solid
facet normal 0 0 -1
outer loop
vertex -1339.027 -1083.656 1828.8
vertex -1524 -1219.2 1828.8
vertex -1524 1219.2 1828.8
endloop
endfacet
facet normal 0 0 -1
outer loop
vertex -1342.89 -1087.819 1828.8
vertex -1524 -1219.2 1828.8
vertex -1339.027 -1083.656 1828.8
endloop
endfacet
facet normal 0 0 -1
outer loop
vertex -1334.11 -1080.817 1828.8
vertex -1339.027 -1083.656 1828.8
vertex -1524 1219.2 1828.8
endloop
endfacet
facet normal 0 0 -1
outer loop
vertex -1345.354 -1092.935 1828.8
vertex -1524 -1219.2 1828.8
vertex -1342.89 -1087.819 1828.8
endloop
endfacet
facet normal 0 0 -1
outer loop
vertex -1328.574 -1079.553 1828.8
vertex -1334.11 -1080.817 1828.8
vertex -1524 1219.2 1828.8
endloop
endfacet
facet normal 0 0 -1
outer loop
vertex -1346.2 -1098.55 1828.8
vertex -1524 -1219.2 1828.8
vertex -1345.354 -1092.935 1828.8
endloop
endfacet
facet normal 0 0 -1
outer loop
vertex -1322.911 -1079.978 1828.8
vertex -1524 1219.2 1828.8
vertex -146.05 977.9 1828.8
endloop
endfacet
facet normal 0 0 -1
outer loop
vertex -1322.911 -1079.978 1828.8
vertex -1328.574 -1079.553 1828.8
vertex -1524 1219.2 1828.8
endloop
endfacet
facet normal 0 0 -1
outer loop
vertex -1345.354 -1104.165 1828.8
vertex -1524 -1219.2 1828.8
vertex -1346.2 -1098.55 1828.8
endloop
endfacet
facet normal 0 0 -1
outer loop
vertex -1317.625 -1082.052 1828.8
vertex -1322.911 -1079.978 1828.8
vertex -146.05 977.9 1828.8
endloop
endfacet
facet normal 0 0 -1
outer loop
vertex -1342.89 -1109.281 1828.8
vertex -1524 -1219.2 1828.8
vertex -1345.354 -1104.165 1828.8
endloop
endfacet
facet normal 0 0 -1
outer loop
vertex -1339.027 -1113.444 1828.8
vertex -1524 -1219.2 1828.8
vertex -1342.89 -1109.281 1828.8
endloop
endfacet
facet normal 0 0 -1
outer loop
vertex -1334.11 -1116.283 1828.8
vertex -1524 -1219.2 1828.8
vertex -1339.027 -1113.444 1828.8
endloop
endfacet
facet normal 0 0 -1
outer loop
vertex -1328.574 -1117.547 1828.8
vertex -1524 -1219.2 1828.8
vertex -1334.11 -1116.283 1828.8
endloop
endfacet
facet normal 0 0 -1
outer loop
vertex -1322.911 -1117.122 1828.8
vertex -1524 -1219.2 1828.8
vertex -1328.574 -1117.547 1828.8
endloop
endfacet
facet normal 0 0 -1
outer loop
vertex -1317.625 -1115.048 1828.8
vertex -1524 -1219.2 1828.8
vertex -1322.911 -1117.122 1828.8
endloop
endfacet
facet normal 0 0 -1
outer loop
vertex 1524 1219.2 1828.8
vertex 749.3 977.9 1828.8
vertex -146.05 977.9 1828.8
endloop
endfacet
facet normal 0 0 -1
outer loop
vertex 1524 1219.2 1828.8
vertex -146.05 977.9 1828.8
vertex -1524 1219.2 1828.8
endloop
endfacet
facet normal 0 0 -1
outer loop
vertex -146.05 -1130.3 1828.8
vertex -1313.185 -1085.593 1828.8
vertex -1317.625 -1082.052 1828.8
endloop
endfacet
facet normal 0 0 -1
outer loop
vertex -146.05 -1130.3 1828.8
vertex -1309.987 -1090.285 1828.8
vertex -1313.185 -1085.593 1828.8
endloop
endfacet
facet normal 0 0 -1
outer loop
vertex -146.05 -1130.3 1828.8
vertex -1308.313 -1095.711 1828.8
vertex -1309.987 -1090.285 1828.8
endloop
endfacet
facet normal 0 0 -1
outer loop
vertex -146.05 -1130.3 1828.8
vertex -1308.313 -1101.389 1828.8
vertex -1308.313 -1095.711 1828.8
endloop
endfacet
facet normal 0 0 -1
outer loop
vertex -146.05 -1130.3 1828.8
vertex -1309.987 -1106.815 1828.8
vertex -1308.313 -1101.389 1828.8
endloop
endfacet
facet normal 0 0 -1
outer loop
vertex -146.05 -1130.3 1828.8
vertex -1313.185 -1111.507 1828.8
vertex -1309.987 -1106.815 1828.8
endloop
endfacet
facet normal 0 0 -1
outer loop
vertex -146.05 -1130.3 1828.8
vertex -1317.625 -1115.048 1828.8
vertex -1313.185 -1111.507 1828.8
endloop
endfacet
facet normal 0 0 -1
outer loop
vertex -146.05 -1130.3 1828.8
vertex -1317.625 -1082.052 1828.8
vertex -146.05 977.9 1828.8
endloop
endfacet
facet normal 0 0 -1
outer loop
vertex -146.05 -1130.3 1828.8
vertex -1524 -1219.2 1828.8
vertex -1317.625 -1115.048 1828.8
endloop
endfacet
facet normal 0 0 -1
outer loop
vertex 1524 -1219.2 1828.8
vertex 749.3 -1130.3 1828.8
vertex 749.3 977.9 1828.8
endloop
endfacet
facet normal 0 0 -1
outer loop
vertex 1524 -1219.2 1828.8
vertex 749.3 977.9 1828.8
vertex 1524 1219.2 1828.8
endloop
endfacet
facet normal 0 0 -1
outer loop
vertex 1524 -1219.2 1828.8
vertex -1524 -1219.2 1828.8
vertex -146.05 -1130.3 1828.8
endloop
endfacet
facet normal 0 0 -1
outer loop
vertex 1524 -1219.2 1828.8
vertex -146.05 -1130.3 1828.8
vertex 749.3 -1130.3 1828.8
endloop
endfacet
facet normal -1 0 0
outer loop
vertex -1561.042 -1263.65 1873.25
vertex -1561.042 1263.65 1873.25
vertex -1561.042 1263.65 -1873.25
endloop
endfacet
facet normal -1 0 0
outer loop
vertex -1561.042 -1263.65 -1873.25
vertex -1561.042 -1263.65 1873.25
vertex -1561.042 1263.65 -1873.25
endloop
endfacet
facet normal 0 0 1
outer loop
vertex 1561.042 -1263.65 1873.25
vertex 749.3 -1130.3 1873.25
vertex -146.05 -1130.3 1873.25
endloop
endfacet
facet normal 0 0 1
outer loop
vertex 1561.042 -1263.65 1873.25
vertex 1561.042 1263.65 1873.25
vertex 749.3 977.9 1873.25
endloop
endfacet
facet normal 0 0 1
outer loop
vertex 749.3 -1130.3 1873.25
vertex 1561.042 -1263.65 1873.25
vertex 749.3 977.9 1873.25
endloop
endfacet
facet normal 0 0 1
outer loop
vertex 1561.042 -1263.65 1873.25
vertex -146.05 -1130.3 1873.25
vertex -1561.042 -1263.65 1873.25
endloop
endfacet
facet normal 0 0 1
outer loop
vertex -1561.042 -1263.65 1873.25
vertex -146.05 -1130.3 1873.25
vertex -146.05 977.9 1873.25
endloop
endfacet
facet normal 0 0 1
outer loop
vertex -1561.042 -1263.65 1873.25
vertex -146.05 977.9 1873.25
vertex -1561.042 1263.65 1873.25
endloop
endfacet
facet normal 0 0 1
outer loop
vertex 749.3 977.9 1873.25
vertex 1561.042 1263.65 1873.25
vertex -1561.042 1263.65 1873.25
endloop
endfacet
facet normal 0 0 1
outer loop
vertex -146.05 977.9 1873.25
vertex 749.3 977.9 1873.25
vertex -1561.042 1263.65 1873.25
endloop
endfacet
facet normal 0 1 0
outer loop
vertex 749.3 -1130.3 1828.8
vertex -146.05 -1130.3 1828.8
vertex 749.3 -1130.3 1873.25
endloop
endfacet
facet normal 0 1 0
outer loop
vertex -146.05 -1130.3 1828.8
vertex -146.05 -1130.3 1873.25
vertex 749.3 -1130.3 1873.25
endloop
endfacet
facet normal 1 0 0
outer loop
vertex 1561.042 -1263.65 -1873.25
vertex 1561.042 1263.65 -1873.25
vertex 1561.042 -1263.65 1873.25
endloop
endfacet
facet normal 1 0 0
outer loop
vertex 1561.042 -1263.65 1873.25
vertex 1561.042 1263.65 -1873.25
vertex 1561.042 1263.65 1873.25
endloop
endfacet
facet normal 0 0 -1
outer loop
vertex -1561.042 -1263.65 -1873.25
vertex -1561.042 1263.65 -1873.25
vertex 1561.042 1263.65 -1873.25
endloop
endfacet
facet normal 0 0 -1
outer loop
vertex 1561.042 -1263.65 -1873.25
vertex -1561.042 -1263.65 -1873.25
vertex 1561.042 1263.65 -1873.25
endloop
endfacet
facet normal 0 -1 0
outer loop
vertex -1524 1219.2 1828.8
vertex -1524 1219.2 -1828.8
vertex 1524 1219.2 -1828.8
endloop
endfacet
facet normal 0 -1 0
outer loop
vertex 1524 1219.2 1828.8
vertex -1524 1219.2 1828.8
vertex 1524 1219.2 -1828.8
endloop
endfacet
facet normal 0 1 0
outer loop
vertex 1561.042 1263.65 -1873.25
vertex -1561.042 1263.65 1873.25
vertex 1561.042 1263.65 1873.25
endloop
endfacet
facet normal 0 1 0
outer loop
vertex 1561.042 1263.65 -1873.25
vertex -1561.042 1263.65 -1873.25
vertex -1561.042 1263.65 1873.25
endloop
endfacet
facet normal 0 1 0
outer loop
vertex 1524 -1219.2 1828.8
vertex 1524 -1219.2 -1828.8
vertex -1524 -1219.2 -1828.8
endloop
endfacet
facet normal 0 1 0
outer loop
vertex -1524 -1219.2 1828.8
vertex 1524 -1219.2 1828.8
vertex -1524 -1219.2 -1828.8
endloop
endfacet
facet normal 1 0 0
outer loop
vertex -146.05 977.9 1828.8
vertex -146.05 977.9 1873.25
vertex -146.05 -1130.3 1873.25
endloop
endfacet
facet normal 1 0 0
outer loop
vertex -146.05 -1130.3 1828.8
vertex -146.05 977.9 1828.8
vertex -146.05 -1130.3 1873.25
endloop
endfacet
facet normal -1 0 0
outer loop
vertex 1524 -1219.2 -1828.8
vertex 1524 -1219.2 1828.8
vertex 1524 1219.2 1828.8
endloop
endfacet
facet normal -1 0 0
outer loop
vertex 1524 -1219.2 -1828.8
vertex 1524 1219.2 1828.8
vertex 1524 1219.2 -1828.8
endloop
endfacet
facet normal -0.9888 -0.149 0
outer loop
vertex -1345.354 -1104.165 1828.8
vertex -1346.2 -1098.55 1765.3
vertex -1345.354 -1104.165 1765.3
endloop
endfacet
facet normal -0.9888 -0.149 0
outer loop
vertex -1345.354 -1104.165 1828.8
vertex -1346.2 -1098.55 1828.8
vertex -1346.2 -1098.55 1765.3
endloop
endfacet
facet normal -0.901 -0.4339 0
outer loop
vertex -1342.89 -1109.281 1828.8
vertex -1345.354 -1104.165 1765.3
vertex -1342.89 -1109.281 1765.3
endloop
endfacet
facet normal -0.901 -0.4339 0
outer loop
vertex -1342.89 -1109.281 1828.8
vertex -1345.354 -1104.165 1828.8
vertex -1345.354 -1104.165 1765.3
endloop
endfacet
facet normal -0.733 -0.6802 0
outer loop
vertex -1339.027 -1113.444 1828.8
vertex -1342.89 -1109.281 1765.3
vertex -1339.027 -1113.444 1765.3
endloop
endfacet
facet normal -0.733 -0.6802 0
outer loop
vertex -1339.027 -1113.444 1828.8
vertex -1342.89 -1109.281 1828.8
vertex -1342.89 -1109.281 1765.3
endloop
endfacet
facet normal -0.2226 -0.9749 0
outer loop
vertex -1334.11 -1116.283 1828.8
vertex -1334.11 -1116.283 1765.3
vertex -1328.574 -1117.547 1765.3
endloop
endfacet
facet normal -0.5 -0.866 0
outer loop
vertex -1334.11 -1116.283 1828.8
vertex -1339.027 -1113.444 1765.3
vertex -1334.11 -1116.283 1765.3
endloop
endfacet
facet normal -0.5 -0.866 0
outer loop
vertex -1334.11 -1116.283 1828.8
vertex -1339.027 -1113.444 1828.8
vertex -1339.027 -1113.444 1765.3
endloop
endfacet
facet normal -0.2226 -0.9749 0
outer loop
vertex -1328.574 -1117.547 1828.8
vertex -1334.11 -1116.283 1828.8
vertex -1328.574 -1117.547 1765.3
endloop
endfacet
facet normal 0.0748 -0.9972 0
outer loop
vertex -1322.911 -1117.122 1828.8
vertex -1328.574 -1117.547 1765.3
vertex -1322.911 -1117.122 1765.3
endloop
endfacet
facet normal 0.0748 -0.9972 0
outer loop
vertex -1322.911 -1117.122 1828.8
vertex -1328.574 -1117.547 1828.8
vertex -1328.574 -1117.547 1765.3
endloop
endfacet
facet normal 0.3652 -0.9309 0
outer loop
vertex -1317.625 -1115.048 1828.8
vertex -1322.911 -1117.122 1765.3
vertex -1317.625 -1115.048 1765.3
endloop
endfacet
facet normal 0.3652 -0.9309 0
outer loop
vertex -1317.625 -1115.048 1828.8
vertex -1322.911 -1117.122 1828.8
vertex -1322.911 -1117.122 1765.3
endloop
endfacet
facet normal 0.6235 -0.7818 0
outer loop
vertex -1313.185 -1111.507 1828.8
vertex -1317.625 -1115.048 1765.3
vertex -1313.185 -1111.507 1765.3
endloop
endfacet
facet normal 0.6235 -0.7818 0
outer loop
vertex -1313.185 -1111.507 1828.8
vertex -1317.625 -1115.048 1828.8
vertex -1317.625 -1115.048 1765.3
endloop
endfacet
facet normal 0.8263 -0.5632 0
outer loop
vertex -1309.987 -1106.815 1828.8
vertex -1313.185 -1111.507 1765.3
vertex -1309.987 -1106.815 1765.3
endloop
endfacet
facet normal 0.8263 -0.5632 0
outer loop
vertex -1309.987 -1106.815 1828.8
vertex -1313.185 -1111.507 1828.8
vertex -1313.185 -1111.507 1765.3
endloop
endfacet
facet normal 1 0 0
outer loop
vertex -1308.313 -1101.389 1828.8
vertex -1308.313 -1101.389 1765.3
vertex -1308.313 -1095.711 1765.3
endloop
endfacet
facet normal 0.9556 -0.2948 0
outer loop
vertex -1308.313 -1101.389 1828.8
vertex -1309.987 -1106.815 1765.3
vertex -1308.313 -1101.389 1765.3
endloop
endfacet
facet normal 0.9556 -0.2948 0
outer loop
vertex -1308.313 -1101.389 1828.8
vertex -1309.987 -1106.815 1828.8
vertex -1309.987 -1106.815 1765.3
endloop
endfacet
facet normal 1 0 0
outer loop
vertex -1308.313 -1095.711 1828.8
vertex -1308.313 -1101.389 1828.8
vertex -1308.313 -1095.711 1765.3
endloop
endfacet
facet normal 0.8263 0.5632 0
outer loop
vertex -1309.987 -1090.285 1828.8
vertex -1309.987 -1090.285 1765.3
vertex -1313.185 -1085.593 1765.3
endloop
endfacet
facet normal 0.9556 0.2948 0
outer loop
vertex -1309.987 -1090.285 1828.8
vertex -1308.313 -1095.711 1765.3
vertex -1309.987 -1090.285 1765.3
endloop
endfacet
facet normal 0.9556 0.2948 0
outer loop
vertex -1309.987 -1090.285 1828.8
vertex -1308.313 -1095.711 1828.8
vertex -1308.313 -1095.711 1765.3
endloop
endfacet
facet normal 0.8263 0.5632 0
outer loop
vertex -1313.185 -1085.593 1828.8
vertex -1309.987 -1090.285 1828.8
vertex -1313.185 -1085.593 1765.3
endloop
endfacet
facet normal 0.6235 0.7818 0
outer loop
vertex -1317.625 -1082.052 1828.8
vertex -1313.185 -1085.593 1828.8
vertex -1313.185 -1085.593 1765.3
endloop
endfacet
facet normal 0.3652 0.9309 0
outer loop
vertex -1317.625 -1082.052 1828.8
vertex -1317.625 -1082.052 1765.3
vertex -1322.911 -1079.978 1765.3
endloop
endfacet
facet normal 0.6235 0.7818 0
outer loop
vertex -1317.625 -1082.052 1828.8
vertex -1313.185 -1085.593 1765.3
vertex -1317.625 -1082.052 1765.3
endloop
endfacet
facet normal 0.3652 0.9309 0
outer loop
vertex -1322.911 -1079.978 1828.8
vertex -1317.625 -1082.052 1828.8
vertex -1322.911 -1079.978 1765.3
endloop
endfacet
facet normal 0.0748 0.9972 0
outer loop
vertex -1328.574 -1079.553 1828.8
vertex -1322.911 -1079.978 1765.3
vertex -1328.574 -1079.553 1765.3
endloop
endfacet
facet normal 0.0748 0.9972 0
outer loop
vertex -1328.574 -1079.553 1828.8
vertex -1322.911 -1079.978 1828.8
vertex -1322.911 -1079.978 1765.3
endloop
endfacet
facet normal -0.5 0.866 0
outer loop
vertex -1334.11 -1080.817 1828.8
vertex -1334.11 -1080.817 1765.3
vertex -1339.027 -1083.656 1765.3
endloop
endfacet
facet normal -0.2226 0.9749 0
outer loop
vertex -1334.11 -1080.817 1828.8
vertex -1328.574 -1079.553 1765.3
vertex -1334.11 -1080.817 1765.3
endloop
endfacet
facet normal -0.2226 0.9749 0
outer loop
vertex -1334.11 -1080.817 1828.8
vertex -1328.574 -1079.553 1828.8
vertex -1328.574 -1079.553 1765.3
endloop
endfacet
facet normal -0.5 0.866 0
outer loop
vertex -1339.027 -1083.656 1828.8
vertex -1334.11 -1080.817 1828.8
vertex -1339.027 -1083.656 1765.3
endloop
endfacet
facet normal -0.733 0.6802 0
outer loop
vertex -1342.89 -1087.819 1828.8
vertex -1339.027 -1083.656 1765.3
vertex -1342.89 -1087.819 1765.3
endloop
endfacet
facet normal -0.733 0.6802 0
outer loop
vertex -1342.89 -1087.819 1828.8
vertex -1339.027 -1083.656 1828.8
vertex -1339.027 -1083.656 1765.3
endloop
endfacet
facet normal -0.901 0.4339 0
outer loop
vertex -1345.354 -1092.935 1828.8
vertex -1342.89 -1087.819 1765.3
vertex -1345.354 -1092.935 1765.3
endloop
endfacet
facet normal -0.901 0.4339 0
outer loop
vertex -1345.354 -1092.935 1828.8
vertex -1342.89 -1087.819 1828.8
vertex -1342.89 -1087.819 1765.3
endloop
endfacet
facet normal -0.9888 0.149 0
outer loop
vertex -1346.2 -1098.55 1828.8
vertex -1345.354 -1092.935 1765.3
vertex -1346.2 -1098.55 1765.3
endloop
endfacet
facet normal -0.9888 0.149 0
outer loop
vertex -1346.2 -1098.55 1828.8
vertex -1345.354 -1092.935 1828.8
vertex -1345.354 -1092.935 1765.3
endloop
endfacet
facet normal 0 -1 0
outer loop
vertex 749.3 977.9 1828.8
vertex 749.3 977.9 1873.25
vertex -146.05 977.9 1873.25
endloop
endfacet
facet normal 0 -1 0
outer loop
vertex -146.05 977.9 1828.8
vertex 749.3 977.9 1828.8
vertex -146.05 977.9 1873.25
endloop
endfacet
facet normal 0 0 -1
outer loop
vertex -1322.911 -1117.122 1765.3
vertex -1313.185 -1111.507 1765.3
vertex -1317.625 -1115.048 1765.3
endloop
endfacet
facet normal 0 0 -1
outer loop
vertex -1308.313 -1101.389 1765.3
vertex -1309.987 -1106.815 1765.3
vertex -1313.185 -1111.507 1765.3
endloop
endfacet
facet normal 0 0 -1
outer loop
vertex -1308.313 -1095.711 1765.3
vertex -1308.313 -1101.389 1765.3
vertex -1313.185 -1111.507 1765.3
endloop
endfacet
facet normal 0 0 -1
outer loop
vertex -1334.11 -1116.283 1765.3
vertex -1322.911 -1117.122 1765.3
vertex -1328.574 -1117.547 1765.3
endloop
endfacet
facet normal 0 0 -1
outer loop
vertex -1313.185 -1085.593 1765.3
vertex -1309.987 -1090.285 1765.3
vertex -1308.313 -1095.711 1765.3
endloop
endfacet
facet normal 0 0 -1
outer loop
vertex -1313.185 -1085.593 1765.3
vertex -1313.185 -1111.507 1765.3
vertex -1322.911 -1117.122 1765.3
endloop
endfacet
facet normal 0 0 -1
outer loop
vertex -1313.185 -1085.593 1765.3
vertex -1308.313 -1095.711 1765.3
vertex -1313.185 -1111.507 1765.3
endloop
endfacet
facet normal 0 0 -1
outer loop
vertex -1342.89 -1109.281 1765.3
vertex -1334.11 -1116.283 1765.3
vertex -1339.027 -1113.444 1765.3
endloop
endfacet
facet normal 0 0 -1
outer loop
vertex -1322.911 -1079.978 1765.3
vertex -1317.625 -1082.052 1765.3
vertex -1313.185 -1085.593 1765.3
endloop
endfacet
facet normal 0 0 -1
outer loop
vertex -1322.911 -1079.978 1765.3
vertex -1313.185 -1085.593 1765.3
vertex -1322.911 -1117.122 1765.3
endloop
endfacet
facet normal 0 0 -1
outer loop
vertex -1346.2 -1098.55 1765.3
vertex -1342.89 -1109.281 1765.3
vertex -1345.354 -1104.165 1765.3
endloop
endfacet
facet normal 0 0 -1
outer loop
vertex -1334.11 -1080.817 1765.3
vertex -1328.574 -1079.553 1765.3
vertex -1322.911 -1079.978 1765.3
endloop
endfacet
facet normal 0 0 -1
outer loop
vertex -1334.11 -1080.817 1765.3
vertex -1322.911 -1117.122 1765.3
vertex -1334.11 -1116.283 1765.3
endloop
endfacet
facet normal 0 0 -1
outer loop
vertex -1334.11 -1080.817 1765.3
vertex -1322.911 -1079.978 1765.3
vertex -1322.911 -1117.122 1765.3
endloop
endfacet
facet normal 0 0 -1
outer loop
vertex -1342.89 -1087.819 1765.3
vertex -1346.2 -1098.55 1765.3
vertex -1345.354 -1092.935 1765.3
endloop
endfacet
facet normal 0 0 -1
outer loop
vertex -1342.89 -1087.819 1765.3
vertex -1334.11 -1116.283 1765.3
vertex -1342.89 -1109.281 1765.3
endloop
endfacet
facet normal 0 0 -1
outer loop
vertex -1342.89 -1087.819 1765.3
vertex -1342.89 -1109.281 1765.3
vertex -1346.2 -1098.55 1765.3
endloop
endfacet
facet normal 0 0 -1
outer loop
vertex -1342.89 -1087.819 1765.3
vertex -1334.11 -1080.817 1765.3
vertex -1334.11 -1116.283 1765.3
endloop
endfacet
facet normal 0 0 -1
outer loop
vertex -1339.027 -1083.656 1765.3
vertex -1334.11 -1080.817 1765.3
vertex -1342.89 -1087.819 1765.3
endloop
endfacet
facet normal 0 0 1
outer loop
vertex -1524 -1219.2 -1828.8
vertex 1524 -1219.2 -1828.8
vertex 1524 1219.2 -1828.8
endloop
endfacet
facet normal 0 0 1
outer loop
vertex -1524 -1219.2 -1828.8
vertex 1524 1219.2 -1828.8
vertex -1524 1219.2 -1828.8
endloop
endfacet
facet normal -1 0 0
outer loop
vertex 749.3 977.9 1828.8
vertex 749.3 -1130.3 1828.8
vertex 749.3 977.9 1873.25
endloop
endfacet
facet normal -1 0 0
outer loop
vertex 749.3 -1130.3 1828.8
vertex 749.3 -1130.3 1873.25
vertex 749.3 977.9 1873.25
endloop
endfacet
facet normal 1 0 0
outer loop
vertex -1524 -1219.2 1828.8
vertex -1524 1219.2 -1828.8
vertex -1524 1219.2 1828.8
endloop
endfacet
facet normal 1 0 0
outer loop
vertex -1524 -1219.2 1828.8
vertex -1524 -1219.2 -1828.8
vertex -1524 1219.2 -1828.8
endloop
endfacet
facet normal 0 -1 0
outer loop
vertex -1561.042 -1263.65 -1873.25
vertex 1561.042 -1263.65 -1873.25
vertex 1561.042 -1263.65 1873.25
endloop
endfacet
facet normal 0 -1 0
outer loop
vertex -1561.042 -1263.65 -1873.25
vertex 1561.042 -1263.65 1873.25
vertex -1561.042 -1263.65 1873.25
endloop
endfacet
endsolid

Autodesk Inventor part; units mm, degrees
ref_plane "YZ Plane" through (0, 0, 0) normal (1, 0, 0) x (0, 1, 0)
ref_plane "XZ Plane" through (0, 0, 0) normal (0, 1, 0) x (-1, 0, 0)
ref_plane "XY Plane" through (0, 0, 0) normal (0, 0, 1) x (1, 0, 0)
sketch "Sketch1" plane through (0, 0, 0) normal (0, 1, 0) x (-1, 0, 0)
  line L0 (1524, 1828.8) -> (-1524, 1828.8)
  line L1 (-1524, 1828.8) -> (-1524, -1828.8)
  line L2 (-1524, -1828.8) -> (1524, -1828.8)
  line L3 (1524, -1828.8) -> (1524, 1828.8)
  line L4 (1524, 1828.8) -> (-1524, -1828.8) construction
  line L5 (-1524, 1828.8) -> (1524, -1828.8) construction
  line L6 (-1561.0417, 1873.25) -> (1561.0417, 1873.25)
  line L7 (1561.0417, 1873.25) -> (1561.0417, -1873.25)
  line L8 (1561.0417, -1873.25) -> (-1561.0417, -1873.25)
  line L9 (-1561.0417, -1873.25) -> (-1561.0417, 1873.25)
  line L10 (-1561.0417, 1873.25) -> (1561.0417, -1873.25) construction
  line L11 (1561.0417, 1873.25) -> (-1561.0417, -1873.25) construction
  point P0 (0, 0)
  dimension "d8" = 3048
  dimension "d9" = 3657.6
  dimension "d10" = 44.45
extrude "sides" add sketch "Sketch1" along normal mid plane 2438.4
sketch "Sketch2" plane through (0, 1219.2, 0) normal (0, 1, 0) x (1, 0, 0)
  line L0 (1561.0417, 1873.25) -> (-1561.0417, 1873.25) projected
  line L1 (-1561.0417, 1873.25) -> (-1561.0417, -1873.25) projected
  line L2 (1561.0417, -1873.25) -> (1561.0417, 1873.25) projected
  line L3 (-1561.0417, -1873.25) -> (1561.0417, -1873.25) projected
  point P0 (0, 0)
extrude "roof" add sketch "Sketch2" along normal blind 44.45
mirror "floor" about plane through (0, 0, 0) normal (0, 1, 0) of "roof"
sketch "Sketch3" plane through (-1561.0417, 1263.65, 1873.25) normal (0, 0, 1) x (1, 0, 0)
  line L0 (1414.9917, -2393.95) -> (2310.3417, -2393.95)
  line L1 (2310.3417, -2393.95) -> (2310.3417, -285.75)
  line L2 (2310.3417, -285.75) -> (1414.9917, -285.75)
  line L3 (1414.9917, -285.75) -> (1414.9917, -2393.95)
  line L4 (1414.9917, -2393.95) -> (2310.3417, -285.75) construction
  line L5 (2310.3417, -2393.95) -> (1414.9917, -285.75) construction
  line L6 (0, 0) -> (0, -2527.3) projected
  line L7 (0, -2527.3) -> (3122.0833, -2527.3) projected
  line L8 (3122.0833, -2527.3) -> (3122.0833, 0) projected
  line L9 (37.0417, -2482.85) -> (3085.0417, -2482.85) projected
  line L10 (3085.0417, -2482.85) -> (3085.0417, -44.45) projected
  line L11 (3122.0833, -2527.3) -> (3122.0833, 0) projected
  line L12 (0, 0) -> (3122.0833, 0) projected
  line L13 (0, 0) -> (0, -2527.3) projected
  line L14 (0, -2527.3) -> (3122.0833, -2527.3) projected
  point P0 (1561.0417, -1263.65)
  point P1 (1862.6667, -1339.85)
  dimension "d19" = 895.35
  dimension "d20" = 2108.2
  dimension "d22" = 88.9
  dimension "d23" = 774.7
extrude "door" cut sketch "Sketch3" against normal up to next contours L3 L2 L1 L0
sketch "Sketch6" plane through (1524, 1219.2, 1828.8) normal (0, 0, -1) x (-1, 0, 0)
  circle A0 centre (2851.15, -2317.75) radius 19.05
  line L0 (3048, -2438.4) -> (0, -2438.4) projected
  line L1 (3048, 0) -> (3048, -2438.4) projected
  point P0 (1524, -1219.2)
  dimension "d24" = 38.1
  dimension "d25" = 120.65
  dimension "d26" = 196.85
extrude "Extrusion6" add sketch "Sketch6" along normal blind 63.5
sketch "Sketch8" plane through (0, 1219.2, 0) normal (0, -1, 0) x (1, 0, 0)
  line L0 (863.6, 1371.6) -> (1117.6, 1371.6)
  line L1 (1117.6, 1371.6) -> (1117.6, 1117.6)
  line L2 (1117.6, 1117.6) -> (863.6, 1117.6)
  line L3 (863.6, 1117.6) -> (863.6, 1371.6)
  line L4 (863.6, 1371.6) -> (1117.6, 1117.6) construction
  line L5 (1117.6, 1371.6) -> (863.6, 1117.6) construction
  line L6 (-1092.2, -1397) -> (-838.2, -1397)
  line L7 (-838.2, -1397) -> (-838.2, -1143)
  line L8 (-838.2, -1143) -> (-1092.2, -1143)
  line L9 (-1092.2, -1143) -> (-1092.2, -1397)
  line L10 (-1092.2, -1397) -> (-838.2, -1143) construction
  line L11 (-838.2, -1397) -> (-1092.2, -1143) construction
  line L12 (1524, -1828.8) -> (1524, 1828.8) projected
  line L13 (1524, 1828.8) -> (-1524, 1828.8) projected
  line L14 (-1524, -1828.8) -> (1524, -1828.8) projected
  line L15 (-1524, 1828.8) -> (-1524, -1828.8) projected
  point P0 (0, 0)
  point P1 (990.6, 1244.6)
  point P2 (-965.2, -1270)
  dimension "d29" = 254
  dimension "d30" = 406.4
  dimension "d31" = 457.2
  dimension "d32" = 431.8
  dimension "d33" = 431.8
extrude "Extrusion7" [suppressed]
sketch "Sketch9" plane through (0, 1263.65, 0) normal (0, 1, 0) x (1, 0, 0)
  line L0 (1561.0417, 1873.25) -> (-1561.0417, 1873.25) projected
  line L1 (-1561.0417, 1873.25) -> (-1561.0417, -1873.25) projected
  line L2 (-1561.0417, -1873.25) -> (1561.0417, -1873.25) projected
  line L3 (1561.0417, -1873.25) -> (1561.0417, 1873.25) projected
  line L4 (1162.05, -1073.15) -> (819.15, -1073.15)
  line L5 (819.15, -1073.15) -> (819.15, -1416.05)
  line L6 (819.15, -1416.05) -> (1162.05, -1416.05)
  line L7 (1162.05, -1416.05) -> (1162.05, -1073.15)
  line L8 (1162.05, -1073.15) -> (819.15, -1416.05) construction
  line L9 (819.15, -1073.15) -> (1162.05, -1416.05) construction
  line L10 (-793.75, 1441.45) -> (-1136.65, 1441.45)
  line L11 (-1136.65, 1441.45) -> (-1136.65, 1098.55)
  line L12 (-1136.65, 1098.55) -> (-793.75, 1098.55)
  line L13 (-793.75, 1098.55) -> (-793.75, 1441.45)
  line L14 (-793.75, 1441.45) -> (-1136.65, 1098.55) construction
  line L15 (-1136.65, 1441.45) -> (-793.75, 1098.55) construction
  line L16 (990.6, -1244.6) -> (1117.6, -1244.6)
  line L17 (1117.6, -1117.6) -> (1117.6, -1371.6) projected
  line L18 (990.6, -1244.6) -> (990.6, -1371.6)
  line L19 (-965.2, 1270) -> (-838.2, 1270)
  line L20 (-965.2, 1270) -> (-965.2, 1143)
  point P0 (0, 0)
extrude "Extrusion8" [suppressed]
equation "\"d8\" = roomWidth"
equation "\"d9\" = roomDepth"
equation "\"d10\" = wallThick"
equation "\"d11\" = roomHeight"
equation "\"d13\" = wallThick"
equation "\"d19\" = doorWidth"
equation "\"d20\" = doorHeight"
equation "\"d22\" = doorY"
equation "\"d23\" = doorX"
equation "\"d15\" = wallThick"
equation "\"wallThick\" = 44.45"
equation "\"roomWidth\" = 3048"
equation "\"roomDepth\" = 3657.6"
equation "\"roomHeight\" = 2438.4"
equation "\"doorWidth\" = 895.35"
equation "\"doorHeight\" = 2108.2"
equation "\"doorX\" = 774.7"
equation "\"doorY\" = 88.9"
equation "\"doorThick\" = 57.15"
equation "\"doorLip\" = 76.2"
equation "\"tubeR\" = 304.8"
equation "\"tubeTurnR\" = 76.2"
equation "\"tubeD\" = 19.05"
properties part number "Room"
